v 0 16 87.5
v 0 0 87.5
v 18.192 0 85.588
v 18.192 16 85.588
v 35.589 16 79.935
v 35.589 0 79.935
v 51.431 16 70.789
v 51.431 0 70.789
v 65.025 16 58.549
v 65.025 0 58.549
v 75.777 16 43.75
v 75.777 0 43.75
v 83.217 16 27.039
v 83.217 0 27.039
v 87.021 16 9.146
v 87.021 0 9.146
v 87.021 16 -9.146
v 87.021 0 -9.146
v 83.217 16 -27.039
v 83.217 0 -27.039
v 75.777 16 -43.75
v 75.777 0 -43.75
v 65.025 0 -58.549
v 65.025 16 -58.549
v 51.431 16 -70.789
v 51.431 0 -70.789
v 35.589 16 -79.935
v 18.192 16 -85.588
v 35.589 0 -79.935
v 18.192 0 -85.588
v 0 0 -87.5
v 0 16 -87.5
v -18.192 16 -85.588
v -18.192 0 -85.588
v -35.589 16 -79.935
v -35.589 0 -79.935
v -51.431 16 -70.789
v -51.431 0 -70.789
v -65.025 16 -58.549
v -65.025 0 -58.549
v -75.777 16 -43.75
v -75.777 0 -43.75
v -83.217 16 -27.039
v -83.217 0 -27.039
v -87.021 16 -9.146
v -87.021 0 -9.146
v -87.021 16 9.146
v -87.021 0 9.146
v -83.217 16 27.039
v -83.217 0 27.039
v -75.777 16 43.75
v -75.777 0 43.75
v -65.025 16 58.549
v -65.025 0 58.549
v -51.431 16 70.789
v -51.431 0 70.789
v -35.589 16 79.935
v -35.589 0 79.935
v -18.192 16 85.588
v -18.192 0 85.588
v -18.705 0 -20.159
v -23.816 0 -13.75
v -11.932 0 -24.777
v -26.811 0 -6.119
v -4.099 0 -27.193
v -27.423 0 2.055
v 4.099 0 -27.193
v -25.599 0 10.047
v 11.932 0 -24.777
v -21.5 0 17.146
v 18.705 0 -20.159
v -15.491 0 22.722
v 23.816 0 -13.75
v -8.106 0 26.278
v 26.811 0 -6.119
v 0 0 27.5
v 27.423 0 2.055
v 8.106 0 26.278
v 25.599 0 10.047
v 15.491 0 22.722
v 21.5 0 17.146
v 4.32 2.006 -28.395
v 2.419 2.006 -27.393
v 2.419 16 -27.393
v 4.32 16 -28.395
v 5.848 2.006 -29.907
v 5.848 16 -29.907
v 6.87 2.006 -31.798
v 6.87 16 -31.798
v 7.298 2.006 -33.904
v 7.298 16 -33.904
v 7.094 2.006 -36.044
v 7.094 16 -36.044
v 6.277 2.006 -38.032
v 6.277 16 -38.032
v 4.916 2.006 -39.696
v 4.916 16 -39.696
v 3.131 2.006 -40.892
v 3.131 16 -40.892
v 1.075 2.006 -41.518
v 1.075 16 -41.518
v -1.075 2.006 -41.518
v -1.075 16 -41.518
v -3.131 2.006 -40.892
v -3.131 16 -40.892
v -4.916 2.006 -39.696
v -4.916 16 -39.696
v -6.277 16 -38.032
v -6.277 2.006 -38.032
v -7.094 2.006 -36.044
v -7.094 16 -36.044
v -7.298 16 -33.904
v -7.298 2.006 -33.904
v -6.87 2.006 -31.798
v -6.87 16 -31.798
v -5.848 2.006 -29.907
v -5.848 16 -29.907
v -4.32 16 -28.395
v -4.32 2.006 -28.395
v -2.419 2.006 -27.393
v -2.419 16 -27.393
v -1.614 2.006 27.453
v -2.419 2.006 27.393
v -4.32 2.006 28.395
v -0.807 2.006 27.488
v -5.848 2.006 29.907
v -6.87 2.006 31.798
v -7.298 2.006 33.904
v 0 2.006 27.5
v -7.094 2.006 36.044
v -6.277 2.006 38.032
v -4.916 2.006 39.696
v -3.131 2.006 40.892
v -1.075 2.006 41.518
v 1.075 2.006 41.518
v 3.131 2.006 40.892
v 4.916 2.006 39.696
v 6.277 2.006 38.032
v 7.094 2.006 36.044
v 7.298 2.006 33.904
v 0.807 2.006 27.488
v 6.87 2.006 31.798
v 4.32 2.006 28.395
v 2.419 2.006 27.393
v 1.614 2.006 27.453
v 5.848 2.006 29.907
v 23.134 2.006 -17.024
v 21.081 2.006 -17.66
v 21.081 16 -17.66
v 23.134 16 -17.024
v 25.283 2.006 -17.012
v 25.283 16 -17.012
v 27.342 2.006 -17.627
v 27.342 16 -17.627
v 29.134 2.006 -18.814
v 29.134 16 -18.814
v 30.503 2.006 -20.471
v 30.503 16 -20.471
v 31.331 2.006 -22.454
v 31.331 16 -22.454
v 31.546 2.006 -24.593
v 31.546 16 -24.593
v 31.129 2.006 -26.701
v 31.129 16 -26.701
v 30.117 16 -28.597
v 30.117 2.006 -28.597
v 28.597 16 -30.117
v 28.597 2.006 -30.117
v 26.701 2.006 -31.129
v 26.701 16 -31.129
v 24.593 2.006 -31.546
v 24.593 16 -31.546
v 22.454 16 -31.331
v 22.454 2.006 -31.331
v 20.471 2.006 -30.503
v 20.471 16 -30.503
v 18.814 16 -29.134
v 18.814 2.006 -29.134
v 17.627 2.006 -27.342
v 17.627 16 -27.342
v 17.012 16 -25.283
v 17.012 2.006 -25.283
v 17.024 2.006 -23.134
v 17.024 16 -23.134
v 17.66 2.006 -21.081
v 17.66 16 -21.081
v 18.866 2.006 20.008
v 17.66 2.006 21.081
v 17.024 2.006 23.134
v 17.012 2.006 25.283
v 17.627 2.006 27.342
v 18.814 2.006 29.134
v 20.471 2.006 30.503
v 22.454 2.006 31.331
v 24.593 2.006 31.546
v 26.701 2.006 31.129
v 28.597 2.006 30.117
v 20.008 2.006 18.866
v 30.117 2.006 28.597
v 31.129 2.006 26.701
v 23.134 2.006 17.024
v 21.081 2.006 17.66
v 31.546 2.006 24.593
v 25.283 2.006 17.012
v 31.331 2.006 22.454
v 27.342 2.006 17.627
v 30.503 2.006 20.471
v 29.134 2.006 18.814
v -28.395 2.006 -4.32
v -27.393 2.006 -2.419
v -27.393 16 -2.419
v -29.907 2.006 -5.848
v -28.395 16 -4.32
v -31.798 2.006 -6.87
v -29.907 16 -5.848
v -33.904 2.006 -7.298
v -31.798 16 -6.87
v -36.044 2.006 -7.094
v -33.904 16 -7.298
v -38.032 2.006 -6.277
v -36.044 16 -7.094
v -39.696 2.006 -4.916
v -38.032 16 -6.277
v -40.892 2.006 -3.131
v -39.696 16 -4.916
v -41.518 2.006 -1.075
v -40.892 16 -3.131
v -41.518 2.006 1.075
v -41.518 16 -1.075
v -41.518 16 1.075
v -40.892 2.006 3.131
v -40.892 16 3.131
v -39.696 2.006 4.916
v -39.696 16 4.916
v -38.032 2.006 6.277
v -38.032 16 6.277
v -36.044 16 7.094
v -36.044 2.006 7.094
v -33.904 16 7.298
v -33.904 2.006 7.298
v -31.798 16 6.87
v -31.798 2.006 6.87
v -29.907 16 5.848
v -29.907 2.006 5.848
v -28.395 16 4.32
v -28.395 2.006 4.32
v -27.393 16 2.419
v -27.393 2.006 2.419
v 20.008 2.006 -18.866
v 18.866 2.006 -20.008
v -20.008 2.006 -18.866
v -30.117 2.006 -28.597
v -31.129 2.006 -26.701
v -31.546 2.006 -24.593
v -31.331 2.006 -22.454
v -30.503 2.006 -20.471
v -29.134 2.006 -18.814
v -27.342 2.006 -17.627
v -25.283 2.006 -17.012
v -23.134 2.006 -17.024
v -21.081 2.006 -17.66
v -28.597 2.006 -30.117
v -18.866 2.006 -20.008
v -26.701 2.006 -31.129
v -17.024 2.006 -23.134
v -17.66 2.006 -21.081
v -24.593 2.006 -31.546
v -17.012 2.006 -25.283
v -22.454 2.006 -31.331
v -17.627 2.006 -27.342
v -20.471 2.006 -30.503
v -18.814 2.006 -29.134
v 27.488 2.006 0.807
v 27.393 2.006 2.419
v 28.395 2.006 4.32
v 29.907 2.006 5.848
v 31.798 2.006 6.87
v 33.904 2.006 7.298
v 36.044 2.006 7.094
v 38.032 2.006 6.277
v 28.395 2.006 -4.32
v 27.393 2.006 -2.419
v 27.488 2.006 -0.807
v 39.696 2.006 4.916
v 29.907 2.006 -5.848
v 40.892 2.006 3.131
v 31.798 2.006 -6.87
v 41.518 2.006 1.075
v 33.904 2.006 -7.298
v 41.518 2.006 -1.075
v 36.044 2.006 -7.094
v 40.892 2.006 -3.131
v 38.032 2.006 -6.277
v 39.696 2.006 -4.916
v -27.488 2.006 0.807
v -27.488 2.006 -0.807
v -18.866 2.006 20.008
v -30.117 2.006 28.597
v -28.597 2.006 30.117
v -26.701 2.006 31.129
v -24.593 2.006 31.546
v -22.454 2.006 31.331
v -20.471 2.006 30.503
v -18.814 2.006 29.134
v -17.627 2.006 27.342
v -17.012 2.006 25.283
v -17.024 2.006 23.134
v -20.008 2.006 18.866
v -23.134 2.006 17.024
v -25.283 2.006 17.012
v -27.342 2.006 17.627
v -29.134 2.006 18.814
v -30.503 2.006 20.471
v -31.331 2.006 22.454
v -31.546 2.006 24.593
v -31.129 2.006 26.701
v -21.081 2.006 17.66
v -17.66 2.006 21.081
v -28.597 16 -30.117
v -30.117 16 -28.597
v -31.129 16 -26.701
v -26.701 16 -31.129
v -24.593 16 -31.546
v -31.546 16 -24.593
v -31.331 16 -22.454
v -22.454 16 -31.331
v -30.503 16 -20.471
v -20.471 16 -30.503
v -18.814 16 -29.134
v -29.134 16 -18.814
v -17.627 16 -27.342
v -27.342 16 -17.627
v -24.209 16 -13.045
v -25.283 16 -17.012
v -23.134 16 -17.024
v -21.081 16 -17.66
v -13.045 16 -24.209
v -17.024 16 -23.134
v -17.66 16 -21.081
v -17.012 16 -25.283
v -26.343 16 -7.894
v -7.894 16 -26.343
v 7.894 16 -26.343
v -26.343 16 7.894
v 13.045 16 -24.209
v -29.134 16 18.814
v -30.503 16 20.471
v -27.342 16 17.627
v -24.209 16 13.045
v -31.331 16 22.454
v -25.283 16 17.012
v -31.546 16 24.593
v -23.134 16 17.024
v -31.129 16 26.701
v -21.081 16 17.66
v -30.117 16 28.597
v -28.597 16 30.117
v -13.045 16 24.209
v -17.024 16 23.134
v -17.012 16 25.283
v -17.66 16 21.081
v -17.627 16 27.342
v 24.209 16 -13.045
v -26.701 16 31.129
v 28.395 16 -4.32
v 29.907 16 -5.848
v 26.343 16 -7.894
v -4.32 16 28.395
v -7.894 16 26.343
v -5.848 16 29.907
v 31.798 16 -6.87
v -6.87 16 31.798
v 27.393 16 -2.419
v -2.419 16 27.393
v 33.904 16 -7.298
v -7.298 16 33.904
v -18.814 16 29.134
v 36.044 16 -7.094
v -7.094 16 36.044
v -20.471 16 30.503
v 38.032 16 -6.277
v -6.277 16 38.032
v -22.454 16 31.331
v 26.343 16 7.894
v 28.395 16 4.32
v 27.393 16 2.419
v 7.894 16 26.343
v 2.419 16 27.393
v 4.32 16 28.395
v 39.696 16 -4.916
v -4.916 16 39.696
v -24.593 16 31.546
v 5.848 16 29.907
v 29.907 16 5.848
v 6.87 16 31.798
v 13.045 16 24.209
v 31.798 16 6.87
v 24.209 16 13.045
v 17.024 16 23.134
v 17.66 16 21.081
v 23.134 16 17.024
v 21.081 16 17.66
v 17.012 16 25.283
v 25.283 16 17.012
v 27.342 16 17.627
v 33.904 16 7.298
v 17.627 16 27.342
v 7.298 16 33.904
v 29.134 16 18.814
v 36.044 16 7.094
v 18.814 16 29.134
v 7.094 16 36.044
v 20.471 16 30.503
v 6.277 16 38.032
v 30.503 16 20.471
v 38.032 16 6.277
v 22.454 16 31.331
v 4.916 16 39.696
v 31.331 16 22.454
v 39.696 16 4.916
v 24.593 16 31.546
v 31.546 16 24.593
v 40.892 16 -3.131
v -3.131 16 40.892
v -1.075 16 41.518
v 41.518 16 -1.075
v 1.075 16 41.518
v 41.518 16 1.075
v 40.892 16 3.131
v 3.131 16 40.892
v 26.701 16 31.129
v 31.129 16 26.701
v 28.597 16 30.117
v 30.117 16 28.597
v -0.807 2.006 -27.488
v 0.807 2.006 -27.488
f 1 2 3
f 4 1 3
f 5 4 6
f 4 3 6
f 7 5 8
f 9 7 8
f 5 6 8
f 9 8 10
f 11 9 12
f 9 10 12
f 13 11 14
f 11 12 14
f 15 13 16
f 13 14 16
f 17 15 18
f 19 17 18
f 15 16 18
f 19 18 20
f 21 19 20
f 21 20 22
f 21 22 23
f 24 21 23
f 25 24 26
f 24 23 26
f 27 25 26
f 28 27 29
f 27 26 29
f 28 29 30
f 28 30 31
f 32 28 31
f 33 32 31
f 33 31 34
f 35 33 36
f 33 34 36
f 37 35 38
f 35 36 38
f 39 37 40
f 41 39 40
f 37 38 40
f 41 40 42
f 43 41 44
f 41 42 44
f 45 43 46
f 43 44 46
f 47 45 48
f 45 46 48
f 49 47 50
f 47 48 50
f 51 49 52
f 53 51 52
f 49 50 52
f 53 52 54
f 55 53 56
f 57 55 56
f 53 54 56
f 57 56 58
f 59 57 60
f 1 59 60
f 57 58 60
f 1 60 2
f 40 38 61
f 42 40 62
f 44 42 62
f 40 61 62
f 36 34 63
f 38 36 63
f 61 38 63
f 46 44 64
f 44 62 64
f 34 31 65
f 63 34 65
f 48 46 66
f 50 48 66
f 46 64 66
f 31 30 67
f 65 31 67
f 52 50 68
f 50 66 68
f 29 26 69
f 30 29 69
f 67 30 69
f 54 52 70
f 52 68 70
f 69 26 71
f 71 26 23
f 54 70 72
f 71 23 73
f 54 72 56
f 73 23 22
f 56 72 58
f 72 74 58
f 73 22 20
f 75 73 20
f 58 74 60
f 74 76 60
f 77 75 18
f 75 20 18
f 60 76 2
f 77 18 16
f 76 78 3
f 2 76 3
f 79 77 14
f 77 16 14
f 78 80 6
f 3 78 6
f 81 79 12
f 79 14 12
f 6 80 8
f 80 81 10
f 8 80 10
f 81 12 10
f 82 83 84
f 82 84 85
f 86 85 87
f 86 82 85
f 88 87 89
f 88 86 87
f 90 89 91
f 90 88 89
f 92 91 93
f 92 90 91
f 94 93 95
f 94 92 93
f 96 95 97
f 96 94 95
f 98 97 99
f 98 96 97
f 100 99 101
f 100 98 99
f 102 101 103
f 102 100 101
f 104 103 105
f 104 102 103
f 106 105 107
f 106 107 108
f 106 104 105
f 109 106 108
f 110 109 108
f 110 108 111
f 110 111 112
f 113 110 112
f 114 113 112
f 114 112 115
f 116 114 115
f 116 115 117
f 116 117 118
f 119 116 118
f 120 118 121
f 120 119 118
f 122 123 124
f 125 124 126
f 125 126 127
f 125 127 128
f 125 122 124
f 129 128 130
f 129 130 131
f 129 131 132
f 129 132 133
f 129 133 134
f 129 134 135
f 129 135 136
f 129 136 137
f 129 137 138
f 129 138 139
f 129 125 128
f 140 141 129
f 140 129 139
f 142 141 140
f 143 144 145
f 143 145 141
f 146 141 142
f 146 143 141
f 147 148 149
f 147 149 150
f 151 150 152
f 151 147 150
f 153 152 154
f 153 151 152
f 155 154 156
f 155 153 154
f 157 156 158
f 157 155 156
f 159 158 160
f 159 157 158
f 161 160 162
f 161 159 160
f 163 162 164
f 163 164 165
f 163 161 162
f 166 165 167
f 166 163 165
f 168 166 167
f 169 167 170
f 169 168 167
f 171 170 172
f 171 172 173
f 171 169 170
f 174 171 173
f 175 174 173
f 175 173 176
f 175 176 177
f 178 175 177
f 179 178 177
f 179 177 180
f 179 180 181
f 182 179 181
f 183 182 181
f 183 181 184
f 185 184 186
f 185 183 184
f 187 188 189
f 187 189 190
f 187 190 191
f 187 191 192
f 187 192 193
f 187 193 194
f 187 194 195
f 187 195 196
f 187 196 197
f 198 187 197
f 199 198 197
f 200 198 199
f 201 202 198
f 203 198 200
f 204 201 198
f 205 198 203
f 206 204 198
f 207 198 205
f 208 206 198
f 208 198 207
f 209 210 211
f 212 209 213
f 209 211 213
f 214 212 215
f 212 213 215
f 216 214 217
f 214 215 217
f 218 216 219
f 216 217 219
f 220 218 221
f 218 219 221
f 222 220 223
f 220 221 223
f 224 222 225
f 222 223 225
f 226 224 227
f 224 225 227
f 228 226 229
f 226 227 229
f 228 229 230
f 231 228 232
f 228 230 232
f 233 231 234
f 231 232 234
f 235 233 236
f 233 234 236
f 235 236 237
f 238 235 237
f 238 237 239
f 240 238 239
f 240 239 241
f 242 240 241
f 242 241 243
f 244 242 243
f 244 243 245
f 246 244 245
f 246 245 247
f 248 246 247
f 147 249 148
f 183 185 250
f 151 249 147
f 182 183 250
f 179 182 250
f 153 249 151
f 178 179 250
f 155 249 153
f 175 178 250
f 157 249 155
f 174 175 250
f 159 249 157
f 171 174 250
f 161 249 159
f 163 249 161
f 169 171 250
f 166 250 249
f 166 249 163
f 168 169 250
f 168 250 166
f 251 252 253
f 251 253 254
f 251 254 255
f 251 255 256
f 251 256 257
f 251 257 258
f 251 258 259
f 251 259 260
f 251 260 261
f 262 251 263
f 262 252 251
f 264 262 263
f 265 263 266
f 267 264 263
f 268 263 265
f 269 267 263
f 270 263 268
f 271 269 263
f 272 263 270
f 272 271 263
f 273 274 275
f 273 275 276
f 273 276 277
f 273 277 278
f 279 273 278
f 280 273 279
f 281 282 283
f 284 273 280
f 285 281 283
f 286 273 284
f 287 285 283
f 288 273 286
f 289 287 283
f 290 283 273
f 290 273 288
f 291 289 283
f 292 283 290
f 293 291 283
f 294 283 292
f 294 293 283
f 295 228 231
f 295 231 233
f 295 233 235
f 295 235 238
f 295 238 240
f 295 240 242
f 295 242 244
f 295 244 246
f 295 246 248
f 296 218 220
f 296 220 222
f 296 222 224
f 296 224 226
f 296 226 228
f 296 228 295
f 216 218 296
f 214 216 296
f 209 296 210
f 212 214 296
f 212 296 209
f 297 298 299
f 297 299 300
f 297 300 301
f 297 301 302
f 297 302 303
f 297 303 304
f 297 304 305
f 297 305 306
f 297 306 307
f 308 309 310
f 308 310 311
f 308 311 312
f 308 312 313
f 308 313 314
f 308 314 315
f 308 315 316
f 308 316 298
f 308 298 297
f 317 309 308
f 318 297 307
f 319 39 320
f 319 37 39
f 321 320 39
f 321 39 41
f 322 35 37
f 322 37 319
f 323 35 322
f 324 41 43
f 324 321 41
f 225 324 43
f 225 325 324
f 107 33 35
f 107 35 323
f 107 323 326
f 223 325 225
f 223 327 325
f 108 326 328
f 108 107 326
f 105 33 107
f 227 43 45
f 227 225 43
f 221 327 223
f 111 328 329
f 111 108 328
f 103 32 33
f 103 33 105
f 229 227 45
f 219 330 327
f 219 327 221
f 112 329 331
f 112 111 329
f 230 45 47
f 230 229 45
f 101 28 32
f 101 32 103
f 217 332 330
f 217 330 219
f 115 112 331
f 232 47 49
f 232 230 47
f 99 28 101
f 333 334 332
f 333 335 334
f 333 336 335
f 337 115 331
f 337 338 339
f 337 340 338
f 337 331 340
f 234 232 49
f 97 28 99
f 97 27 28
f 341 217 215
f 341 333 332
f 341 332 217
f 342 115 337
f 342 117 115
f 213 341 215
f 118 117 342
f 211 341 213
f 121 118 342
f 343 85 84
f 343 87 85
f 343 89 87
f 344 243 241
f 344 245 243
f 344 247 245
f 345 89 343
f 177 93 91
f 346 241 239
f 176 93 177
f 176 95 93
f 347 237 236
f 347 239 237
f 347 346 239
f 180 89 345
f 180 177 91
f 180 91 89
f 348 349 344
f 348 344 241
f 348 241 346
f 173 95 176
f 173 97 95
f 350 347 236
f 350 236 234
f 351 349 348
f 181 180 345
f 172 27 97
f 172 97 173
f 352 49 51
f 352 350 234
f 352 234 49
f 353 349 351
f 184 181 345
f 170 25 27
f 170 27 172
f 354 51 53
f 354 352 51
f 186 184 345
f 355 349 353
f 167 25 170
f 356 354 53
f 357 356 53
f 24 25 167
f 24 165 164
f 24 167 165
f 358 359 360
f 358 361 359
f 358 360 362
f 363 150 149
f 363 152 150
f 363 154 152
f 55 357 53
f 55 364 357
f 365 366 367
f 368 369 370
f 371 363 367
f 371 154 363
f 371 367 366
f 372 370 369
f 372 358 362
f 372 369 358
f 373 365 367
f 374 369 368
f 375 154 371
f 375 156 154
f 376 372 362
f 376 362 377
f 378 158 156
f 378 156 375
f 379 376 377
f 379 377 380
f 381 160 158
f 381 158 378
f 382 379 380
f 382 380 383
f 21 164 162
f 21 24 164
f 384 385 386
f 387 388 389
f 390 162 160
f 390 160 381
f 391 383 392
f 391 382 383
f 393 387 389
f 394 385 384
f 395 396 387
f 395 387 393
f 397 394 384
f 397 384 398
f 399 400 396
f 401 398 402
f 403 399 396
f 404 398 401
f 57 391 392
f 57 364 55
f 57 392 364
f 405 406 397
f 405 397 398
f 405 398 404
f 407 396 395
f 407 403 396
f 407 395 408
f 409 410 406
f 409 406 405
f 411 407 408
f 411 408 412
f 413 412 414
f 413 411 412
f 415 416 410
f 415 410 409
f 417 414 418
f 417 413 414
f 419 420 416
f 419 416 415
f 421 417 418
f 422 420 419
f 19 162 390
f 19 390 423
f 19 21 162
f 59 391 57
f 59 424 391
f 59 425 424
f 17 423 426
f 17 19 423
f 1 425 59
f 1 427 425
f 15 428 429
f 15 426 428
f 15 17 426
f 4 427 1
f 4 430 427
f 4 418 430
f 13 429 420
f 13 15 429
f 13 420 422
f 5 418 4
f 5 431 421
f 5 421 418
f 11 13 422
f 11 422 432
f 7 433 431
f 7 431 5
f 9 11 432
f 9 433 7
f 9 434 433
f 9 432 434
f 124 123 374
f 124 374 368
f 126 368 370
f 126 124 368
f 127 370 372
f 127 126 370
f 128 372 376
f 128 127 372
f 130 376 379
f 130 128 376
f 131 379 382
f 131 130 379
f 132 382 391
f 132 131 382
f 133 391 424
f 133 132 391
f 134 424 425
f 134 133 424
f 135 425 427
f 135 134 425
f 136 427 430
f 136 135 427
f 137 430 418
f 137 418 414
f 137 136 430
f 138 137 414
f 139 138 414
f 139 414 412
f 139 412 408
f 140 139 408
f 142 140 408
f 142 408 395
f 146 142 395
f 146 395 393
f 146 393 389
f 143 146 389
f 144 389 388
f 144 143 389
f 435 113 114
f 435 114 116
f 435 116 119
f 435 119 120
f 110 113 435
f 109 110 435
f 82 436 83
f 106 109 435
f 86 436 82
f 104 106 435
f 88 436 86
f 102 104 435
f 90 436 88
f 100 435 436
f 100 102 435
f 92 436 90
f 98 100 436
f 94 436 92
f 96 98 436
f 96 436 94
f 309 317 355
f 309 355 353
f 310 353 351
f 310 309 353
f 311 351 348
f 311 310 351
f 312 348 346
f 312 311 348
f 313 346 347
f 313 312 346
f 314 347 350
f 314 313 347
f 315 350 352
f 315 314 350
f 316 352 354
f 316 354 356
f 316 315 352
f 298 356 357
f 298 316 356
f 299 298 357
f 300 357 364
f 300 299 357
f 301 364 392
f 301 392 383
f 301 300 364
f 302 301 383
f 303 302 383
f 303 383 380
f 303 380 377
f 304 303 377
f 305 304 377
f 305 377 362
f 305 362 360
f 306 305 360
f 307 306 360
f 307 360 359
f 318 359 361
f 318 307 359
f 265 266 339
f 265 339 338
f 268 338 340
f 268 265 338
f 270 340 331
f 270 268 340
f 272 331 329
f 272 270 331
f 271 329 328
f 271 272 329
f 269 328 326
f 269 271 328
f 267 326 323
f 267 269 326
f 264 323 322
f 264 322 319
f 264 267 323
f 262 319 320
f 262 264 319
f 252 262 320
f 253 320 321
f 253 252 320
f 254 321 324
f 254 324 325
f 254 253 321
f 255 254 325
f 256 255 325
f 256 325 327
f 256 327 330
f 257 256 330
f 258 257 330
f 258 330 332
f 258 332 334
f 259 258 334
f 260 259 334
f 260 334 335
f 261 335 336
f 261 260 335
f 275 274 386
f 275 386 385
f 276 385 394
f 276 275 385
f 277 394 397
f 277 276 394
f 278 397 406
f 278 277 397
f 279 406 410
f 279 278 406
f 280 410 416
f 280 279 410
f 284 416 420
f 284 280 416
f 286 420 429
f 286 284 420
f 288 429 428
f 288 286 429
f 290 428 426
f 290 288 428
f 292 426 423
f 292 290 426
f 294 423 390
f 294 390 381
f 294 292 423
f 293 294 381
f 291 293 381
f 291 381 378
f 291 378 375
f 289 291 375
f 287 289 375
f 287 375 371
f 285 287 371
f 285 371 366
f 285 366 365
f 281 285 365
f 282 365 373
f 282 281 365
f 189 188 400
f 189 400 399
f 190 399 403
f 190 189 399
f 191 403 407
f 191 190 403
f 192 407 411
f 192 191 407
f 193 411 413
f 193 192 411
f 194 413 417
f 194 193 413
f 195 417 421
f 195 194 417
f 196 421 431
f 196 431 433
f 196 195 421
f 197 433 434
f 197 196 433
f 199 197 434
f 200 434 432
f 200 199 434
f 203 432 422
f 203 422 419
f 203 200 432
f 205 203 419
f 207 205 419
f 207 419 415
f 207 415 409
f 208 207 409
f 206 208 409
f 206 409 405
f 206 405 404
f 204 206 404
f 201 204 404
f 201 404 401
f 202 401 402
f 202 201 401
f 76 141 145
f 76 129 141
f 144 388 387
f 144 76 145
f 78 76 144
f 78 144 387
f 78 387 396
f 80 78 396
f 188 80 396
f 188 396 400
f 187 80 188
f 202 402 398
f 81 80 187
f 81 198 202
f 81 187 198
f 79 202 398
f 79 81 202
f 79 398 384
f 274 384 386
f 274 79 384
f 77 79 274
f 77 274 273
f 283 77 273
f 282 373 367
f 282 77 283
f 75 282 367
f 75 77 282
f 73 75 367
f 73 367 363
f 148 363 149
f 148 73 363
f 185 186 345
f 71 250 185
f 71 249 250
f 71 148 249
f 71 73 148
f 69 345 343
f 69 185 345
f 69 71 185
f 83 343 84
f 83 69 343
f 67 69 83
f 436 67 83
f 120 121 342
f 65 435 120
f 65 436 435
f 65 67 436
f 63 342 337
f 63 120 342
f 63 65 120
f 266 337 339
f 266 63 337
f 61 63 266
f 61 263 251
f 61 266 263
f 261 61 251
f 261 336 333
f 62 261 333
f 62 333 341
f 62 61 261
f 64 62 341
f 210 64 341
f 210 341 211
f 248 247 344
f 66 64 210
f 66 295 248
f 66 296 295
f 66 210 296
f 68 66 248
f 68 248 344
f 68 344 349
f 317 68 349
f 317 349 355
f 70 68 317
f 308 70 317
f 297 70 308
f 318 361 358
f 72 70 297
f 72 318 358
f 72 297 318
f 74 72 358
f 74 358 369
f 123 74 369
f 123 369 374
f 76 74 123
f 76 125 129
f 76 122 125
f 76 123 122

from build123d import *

# Parameters (mm, degrees)
SKETCH1_R           = 87.5
BOSS_EXTRUDE1_DEPTH = 16
SKETCH2_R           = 27.5
CUT_EXTRUDE1_DEPTH  = 125.773795326
SKETCH3_R           = 7.307789365
CUT_EXTRUDE2_DEPTH  = 13.994230173
CIRPATTERN1_COUNT   = 8


with BuildPart() as part:
    # Sketch1 → Boss-Extrude1 (new body)
    with BuildSketch(Plane(origin=(0, 0, 0), x_dir=(1, 0, 0), z_dir=(0, 1, 0))):
        Circle(SKETCH1_R)
    extrude(amount=BOSS_EXTRUDE1_DEPTH)

    # Sketch2 → Cut-Extrude1 (cut, through all)
    with BuildSketch(Plane(origin=(0, 0, 0), x_dir=(1, 0, 0), z_dir=(0, 1, 0))):
        Circle(SKETCH2_R)
    extrude(amount=CUT_EXTRUDE1_DEPTH, mode=Mode.SUBTRACT)

    # Sketch3 → Cut-Extrude2 (cut)
    with BuildSketch(Plane(origin=(0, 16, 0), x_dir=(1, 0, 0), z_dir=(0, 1, 0))):
        with Locations((-34.289217919, 0)):
            Circle(SKETCH3_R)
    cut_extrude2 = extrude(amount=-CUT_EXTRUDE2_DEPTH, mode=Mode.SUBTRACT)

    # CirPattern1: Cut-Extrude2 ×8 about axis
    cirpattern1_axis = Axis((0, 0, 0), (0, 1, 0))
    for i in range(1, CIRPATTERN1_COUNT):
        add(cut_extrude2.rotate(cirpattern1_axis, i * 360 / CIRPATTERN1_COUNT), mode=Mode.SUBTRACT)


solid = part.part
